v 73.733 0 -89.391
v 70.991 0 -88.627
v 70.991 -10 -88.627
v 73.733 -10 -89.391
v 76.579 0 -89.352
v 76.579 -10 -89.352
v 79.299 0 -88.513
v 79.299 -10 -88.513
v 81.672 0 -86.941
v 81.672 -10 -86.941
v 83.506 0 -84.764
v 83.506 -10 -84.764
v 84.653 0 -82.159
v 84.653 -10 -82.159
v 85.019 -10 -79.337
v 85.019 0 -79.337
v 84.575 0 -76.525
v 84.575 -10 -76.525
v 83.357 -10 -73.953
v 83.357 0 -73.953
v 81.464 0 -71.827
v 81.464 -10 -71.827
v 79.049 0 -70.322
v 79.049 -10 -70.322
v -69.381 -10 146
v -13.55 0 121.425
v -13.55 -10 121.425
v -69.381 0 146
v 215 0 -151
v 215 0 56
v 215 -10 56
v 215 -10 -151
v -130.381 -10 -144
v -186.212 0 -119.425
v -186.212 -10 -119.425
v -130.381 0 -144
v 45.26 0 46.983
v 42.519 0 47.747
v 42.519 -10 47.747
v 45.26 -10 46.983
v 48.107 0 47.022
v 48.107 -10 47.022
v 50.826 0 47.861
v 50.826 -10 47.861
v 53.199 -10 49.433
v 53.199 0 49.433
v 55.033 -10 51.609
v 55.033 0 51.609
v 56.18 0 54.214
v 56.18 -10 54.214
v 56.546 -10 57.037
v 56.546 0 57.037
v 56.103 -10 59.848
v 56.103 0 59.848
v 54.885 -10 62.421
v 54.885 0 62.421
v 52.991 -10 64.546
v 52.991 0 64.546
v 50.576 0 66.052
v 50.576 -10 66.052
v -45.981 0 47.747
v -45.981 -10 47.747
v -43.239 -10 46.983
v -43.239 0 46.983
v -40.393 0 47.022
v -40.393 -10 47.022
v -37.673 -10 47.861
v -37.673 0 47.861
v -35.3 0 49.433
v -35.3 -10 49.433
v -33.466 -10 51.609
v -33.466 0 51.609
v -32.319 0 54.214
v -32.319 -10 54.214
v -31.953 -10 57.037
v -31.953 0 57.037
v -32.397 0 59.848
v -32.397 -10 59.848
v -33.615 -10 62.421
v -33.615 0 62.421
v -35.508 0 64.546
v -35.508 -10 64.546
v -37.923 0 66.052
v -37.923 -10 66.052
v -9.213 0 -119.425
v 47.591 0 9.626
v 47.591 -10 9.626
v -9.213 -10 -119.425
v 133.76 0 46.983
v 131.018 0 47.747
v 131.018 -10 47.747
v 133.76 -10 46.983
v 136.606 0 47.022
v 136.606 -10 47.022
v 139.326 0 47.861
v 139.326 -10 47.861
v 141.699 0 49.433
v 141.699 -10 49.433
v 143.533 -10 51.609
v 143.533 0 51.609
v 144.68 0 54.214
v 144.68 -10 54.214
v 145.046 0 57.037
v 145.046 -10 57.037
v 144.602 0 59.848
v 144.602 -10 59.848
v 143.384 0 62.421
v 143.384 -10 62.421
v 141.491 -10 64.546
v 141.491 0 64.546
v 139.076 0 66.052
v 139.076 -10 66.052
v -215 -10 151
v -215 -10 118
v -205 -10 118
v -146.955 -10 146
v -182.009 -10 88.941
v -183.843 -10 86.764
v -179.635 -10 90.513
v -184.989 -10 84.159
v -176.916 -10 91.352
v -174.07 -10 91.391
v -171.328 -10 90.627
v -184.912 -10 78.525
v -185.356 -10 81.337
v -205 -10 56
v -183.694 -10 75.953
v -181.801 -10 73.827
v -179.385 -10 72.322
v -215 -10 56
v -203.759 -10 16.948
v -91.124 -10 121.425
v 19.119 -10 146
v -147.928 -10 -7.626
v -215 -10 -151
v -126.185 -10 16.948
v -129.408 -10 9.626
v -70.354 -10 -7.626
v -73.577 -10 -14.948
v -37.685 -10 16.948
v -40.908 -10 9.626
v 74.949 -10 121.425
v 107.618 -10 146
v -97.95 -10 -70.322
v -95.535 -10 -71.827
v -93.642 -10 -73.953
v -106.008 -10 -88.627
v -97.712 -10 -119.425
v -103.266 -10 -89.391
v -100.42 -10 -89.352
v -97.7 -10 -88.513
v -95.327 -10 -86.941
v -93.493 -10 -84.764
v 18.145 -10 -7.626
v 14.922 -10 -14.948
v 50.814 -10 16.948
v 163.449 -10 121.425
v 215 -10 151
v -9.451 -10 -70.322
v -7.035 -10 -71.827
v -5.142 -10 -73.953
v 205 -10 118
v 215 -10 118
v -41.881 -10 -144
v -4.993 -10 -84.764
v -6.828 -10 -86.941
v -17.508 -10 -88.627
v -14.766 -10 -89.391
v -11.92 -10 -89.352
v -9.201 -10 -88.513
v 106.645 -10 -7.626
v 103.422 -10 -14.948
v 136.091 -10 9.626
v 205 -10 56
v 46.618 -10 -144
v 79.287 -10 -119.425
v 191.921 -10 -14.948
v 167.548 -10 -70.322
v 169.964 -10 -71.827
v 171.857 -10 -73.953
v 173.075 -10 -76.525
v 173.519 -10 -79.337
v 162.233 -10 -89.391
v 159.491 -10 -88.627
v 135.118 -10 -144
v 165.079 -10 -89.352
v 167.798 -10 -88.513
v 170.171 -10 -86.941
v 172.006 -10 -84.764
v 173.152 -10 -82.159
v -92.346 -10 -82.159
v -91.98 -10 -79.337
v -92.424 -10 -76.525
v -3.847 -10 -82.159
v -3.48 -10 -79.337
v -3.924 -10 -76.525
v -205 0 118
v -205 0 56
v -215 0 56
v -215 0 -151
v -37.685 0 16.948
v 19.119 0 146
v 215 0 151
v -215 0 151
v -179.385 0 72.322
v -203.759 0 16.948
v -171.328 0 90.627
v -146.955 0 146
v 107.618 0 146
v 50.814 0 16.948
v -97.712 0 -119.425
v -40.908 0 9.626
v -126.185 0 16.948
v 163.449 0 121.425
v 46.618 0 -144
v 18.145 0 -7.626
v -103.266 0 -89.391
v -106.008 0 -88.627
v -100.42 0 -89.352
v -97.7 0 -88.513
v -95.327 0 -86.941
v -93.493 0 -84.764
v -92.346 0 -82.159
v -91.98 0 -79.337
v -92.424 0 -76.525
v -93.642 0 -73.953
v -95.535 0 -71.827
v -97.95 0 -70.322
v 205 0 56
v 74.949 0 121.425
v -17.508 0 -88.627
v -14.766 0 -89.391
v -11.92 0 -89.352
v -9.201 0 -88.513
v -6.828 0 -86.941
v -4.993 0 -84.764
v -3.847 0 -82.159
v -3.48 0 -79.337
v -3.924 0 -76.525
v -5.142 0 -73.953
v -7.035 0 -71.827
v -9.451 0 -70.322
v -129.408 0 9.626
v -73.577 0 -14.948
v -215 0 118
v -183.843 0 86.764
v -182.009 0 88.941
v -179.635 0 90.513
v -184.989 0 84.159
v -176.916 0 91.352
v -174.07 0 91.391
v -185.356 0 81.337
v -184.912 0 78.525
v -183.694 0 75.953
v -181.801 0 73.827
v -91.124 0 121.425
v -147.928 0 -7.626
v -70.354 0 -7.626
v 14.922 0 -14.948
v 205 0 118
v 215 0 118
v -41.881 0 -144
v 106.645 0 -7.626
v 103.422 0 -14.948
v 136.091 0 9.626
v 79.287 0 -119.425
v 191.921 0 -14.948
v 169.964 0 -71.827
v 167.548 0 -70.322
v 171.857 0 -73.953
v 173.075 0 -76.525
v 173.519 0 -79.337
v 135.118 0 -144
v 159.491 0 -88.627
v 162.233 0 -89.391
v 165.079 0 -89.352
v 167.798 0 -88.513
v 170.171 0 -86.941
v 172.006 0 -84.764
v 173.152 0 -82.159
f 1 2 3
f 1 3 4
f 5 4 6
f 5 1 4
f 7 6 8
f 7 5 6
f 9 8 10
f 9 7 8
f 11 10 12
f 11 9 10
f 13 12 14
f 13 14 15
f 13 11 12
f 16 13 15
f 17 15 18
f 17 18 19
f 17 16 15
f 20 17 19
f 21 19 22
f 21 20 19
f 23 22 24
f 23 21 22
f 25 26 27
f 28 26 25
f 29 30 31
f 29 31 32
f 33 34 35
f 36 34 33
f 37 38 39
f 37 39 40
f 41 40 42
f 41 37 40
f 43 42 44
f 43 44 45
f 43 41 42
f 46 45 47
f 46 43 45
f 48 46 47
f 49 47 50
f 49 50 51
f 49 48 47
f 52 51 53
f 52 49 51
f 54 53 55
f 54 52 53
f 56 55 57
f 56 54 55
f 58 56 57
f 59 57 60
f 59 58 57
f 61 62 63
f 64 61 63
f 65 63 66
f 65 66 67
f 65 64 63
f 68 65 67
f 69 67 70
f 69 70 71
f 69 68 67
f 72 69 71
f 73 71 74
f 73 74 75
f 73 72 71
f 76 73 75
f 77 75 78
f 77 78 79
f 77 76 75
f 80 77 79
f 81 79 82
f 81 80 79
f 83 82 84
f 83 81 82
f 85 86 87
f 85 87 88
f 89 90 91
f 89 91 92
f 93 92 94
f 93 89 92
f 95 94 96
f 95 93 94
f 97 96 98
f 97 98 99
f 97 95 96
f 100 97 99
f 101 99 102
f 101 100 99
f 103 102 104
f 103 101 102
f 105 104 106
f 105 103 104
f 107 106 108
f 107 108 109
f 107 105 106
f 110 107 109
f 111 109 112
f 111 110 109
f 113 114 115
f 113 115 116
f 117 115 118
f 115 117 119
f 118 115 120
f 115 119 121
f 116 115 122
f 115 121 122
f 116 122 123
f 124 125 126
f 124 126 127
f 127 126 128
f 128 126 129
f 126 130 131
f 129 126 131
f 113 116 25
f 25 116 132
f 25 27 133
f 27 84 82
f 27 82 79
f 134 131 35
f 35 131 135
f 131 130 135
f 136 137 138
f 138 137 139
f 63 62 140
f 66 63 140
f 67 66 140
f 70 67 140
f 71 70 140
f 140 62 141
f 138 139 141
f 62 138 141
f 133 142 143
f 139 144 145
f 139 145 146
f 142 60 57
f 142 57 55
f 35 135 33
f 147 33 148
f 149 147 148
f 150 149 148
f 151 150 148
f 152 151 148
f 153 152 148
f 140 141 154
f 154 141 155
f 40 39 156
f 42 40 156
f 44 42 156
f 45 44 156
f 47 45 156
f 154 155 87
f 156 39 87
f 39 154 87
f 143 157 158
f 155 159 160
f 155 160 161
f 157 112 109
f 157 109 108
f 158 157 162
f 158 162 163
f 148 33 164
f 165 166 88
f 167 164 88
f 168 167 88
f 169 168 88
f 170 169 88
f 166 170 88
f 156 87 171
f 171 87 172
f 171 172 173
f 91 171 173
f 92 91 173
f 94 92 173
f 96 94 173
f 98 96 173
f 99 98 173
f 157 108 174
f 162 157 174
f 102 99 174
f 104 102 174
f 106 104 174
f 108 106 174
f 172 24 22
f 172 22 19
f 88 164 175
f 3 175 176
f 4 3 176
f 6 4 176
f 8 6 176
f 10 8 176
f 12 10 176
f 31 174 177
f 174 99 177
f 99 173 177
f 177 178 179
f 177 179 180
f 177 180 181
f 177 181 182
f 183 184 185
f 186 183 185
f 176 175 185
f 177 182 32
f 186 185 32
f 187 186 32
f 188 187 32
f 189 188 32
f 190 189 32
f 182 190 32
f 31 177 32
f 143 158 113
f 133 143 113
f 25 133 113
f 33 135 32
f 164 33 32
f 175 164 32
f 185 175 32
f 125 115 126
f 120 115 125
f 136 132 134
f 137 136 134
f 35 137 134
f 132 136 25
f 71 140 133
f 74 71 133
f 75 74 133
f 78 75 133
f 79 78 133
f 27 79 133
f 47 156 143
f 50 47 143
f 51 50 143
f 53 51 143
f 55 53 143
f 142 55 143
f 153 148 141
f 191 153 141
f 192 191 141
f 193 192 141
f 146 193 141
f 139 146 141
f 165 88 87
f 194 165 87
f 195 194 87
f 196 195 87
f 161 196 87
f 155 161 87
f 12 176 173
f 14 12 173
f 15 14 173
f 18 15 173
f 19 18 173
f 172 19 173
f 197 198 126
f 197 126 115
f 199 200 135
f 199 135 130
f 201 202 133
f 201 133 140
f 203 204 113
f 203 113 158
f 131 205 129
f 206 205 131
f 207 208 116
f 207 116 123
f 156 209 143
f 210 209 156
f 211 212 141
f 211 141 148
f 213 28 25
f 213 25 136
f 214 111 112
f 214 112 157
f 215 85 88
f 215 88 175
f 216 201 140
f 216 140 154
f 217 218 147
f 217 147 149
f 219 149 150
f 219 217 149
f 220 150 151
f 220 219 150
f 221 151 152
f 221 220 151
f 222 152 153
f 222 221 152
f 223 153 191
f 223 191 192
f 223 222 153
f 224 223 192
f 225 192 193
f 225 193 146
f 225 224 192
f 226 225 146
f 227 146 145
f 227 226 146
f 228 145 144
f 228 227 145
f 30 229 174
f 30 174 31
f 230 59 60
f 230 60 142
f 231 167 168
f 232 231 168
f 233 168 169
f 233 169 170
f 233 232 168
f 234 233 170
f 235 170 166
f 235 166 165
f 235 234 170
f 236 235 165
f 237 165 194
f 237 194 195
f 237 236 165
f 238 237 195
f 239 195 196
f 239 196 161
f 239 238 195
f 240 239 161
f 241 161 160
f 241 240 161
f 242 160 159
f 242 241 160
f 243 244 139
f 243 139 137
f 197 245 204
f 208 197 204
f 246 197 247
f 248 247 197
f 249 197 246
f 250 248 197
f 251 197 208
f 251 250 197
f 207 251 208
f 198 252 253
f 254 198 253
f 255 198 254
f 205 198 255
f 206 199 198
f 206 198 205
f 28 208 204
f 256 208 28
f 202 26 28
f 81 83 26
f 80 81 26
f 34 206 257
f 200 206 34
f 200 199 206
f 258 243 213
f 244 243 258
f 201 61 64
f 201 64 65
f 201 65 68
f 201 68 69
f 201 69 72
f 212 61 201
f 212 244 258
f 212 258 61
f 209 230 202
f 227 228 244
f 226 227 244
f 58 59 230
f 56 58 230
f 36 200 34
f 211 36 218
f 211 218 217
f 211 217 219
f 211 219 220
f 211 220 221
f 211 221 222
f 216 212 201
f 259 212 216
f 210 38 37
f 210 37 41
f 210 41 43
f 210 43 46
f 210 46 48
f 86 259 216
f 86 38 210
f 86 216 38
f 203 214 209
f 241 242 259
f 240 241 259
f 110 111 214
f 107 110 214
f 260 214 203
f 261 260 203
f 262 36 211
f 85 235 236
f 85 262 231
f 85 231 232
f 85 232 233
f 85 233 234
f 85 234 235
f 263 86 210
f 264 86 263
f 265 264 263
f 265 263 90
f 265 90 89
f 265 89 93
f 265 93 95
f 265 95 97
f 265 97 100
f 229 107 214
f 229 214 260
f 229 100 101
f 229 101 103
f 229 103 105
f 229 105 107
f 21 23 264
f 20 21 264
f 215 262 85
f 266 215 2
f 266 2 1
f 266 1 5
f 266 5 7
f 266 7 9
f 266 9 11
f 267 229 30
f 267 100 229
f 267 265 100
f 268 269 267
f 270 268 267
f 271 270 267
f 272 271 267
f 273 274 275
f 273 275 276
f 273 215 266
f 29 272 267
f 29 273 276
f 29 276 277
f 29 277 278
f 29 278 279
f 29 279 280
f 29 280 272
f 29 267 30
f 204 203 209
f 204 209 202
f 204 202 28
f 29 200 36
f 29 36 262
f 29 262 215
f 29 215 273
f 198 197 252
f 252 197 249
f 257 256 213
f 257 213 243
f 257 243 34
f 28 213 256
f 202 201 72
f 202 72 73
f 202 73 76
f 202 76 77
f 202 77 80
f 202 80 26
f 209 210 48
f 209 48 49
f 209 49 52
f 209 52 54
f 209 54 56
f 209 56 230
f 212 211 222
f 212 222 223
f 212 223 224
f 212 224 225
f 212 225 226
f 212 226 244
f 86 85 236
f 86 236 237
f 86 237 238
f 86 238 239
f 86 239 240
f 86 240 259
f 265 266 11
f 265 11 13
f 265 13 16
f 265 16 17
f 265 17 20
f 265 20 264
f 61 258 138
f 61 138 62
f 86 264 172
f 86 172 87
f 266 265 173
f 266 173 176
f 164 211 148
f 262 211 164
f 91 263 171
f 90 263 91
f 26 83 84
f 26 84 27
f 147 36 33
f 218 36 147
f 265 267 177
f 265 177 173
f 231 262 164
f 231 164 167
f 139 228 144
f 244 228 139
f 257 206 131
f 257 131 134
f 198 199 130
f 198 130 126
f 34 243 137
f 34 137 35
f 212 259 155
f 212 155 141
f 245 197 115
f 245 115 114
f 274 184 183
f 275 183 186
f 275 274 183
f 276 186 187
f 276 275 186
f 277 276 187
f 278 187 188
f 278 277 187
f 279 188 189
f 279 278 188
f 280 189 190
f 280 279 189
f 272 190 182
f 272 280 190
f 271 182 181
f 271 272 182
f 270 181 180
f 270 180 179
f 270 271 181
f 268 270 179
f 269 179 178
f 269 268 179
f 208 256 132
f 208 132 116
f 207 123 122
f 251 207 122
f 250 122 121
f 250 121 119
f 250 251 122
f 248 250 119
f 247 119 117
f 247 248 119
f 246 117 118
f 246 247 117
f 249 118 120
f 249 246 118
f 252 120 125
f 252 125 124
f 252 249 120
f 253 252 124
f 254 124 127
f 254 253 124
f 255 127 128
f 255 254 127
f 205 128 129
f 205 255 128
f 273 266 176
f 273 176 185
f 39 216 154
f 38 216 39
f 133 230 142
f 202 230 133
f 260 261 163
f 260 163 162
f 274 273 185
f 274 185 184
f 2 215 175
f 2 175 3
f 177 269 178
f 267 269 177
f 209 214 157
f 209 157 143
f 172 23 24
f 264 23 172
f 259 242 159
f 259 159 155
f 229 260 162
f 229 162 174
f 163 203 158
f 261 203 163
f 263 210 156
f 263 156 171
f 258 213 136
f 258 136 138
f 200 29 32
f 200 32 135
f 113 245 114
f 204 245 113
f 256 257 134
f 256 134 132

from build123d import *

# Parameters (mm, degrees)
BOSS_EXTRUDE1_DEPTH = 10


with BuildPart() as part:
    # Sketch1 → Boss-Extrude1 (new body)
    with BuildSketch(Plane(origin=(0, 0, 0), x_dir=(1, 0, 0), z_dir=(0, 1, 0))):
        Polygon((-215, -118), (-215, -151), (215, -151), (215, -118), (205, -118), (205, -101), (205, -56), (215, -56), (215, 151), (-215, 151), (-215, -56), (-205, -56), (-205, -101), (-205, -118), align=None)
        with BuildLine():
            Line((-179.385227366, -72.32161442), (-203.75855493, -16.948417804))
            Line((-203.75855493, -16.948417804), (-147.92772859, 7.626342219))
            Line((-147.92772859, 7.626342219), (-91.123775094, -121.425239977))
            Line((-91.123775094, -121.425239977), (-146.954601434, -146))
            Line((-146.954601434, -146), (-171.327928998, -90.626803384))
            ThreePointArc((-171.327928998, -90.626803384), (-184.509172664, -85.502858086), (-179.385227366, -72.32161442))
        make_face(mode=Mode.SUBTRACT)
        with BuildLine():
            Line((-69.380969017, -146), (-126.184922514, -16.948417804))
            Line((-126.184922514, -16.948417804), (-70.354096174, 7.626342219))
            Line((-70.354096174, 7.626342219), (-45.98076861, -47.746854397))
            ThreePointArc((-45.98076861, -47.746854397), (-32.799524944, -52.870799695), (-37.923470242, -66.052043361))
            Line((-37.923470242, -66.052043361), (-13.550142678, -121.425239977))
            Line((-13.550142678, -121.425239977), (-69.380969017, -146))
        make_face(mode=Mode.SUBTRACT)
        with BuildLine():
            Line((19.11852712, -146), (-37.685426377, -16.948417804))
            Line((-37.685426377, -16.948417804), (18.145399963, 7.626342219))
            Line((18.145399963, 7.626342219), (42.518727527, -47.746854397))
            ThreePointArc((42.518727527, -47.746854397), (55.699971193, -52.870799695), (50.576025895, -66.052043361))
            Line((50.576025895, -66.052043361), (74.94935346, -121.425239977))
            Line((74.94935346, -121.425239977), (19.11852712, -146))
        make_face(mode=Mode.SUBTRACT)
        with BuildLine():
            Line((107.618023257, -146), (50.81406976, -16.948417804))
            Line((50.81406976, -16.948417804), (106.6448961, 7.626342219))
            Line((106.6448961, 7.626342219), (131.018223664, -47.746854397))
            ThreePointArc((131.018223664, -47.746854397), (144.19946733, -52.870799695), (139.075522033, -66.052043361))
            Line((139.075522033, -66.052043361), (163.448849597, -121.425239977))
            Line((163.448849597, -121.425239977), (107.618023257, -146))
        make_face(mode=Mode.SUBTRACT)
        with BuildLine():
            Line((-129.407841861, -9.626342219), (-186.211795357, 119.425239977))
            Line((-186.211795357, 119.425239977), (-130.380969017, 144))
            Line((-130.380969017, 144), (-106.007641453, 88.626803384))
            ThreePointArc((-106.007641453, 88.626803384), (-92.826397787, 83.502858086), (-97.950343085, 70.32161442))
            Line((-97.950343085, 70.32161442), (-73.577015521, 14.948417804))
            Line((-73.577015521, 14.948417804), (-129.407841861, -9.626342219))
        make_face(mode=Mode.SUBTRACT)
        with BuildLine():
            Line((-40.908345724, -9.626342219), (-97.71229922, 119.425239977))
            Line((-97.71229922, 119.425239977), (-41.88147288, 144))
            Line((-41.88147288, 144), (-17.508145316, 88.626803384))
            ThreePointArc((-17.508145316, 88.626803384), (-4.32690165, 83.502858086), (-9.450846948, 70.32161442))
            Line((-9.450846948, 70.32161442), (14.922480616, 14.948417804))
            Line((14.922480616, 14.948417804), (-40.908345724, -9.626342219))
        make_face(mode=Mode.SUBTRACT)
        with BuildLine():
            Line((47.591150413, -9.626342219), (-9.212803083, 119.425239977))
            Line((-9.212803083, 119.425239977), (46.618023257, 144))
            Line((46.618023257, 144), (70.991350821, 88.626803384))
            ThreePointArc((70.991350821, 88.626803384), (84.172594487, 83.502858086), (79.048649189, 70.32161442))
            Line((79.048649189, 70.32161442), (103.421976753, 14.948417804))
            Line((103.421976753, 14.948417804), (47.591150413, -9.626342219))
        make_face(mode=Mode.SUBTRACT)
        with BuildLine():
            Line((136.09064655, -9.626342219), (79.286693054, 119.425239977))
            Line((79.286693054, 119.425239977), (135.117519394, 144))
            Line((135.117519394, 144), (159.490846958, 88.626803384))
            ThreePointArc((159.490846958, 88.626803384), (172.672090624, 83.502858086), (167.548145326, 70.32161442))
            Line((167.548145326, 70.32161442), (191.92147289, 14.948417804))
            Line((191.92147289, 14.948417804), (136.09064655, -9.626342219))
        make_face(mode=Mode.SUBTRACT)
    extrude(amount=-BOSS_EXTRUDE1_DEPTH)


solid = part.part
